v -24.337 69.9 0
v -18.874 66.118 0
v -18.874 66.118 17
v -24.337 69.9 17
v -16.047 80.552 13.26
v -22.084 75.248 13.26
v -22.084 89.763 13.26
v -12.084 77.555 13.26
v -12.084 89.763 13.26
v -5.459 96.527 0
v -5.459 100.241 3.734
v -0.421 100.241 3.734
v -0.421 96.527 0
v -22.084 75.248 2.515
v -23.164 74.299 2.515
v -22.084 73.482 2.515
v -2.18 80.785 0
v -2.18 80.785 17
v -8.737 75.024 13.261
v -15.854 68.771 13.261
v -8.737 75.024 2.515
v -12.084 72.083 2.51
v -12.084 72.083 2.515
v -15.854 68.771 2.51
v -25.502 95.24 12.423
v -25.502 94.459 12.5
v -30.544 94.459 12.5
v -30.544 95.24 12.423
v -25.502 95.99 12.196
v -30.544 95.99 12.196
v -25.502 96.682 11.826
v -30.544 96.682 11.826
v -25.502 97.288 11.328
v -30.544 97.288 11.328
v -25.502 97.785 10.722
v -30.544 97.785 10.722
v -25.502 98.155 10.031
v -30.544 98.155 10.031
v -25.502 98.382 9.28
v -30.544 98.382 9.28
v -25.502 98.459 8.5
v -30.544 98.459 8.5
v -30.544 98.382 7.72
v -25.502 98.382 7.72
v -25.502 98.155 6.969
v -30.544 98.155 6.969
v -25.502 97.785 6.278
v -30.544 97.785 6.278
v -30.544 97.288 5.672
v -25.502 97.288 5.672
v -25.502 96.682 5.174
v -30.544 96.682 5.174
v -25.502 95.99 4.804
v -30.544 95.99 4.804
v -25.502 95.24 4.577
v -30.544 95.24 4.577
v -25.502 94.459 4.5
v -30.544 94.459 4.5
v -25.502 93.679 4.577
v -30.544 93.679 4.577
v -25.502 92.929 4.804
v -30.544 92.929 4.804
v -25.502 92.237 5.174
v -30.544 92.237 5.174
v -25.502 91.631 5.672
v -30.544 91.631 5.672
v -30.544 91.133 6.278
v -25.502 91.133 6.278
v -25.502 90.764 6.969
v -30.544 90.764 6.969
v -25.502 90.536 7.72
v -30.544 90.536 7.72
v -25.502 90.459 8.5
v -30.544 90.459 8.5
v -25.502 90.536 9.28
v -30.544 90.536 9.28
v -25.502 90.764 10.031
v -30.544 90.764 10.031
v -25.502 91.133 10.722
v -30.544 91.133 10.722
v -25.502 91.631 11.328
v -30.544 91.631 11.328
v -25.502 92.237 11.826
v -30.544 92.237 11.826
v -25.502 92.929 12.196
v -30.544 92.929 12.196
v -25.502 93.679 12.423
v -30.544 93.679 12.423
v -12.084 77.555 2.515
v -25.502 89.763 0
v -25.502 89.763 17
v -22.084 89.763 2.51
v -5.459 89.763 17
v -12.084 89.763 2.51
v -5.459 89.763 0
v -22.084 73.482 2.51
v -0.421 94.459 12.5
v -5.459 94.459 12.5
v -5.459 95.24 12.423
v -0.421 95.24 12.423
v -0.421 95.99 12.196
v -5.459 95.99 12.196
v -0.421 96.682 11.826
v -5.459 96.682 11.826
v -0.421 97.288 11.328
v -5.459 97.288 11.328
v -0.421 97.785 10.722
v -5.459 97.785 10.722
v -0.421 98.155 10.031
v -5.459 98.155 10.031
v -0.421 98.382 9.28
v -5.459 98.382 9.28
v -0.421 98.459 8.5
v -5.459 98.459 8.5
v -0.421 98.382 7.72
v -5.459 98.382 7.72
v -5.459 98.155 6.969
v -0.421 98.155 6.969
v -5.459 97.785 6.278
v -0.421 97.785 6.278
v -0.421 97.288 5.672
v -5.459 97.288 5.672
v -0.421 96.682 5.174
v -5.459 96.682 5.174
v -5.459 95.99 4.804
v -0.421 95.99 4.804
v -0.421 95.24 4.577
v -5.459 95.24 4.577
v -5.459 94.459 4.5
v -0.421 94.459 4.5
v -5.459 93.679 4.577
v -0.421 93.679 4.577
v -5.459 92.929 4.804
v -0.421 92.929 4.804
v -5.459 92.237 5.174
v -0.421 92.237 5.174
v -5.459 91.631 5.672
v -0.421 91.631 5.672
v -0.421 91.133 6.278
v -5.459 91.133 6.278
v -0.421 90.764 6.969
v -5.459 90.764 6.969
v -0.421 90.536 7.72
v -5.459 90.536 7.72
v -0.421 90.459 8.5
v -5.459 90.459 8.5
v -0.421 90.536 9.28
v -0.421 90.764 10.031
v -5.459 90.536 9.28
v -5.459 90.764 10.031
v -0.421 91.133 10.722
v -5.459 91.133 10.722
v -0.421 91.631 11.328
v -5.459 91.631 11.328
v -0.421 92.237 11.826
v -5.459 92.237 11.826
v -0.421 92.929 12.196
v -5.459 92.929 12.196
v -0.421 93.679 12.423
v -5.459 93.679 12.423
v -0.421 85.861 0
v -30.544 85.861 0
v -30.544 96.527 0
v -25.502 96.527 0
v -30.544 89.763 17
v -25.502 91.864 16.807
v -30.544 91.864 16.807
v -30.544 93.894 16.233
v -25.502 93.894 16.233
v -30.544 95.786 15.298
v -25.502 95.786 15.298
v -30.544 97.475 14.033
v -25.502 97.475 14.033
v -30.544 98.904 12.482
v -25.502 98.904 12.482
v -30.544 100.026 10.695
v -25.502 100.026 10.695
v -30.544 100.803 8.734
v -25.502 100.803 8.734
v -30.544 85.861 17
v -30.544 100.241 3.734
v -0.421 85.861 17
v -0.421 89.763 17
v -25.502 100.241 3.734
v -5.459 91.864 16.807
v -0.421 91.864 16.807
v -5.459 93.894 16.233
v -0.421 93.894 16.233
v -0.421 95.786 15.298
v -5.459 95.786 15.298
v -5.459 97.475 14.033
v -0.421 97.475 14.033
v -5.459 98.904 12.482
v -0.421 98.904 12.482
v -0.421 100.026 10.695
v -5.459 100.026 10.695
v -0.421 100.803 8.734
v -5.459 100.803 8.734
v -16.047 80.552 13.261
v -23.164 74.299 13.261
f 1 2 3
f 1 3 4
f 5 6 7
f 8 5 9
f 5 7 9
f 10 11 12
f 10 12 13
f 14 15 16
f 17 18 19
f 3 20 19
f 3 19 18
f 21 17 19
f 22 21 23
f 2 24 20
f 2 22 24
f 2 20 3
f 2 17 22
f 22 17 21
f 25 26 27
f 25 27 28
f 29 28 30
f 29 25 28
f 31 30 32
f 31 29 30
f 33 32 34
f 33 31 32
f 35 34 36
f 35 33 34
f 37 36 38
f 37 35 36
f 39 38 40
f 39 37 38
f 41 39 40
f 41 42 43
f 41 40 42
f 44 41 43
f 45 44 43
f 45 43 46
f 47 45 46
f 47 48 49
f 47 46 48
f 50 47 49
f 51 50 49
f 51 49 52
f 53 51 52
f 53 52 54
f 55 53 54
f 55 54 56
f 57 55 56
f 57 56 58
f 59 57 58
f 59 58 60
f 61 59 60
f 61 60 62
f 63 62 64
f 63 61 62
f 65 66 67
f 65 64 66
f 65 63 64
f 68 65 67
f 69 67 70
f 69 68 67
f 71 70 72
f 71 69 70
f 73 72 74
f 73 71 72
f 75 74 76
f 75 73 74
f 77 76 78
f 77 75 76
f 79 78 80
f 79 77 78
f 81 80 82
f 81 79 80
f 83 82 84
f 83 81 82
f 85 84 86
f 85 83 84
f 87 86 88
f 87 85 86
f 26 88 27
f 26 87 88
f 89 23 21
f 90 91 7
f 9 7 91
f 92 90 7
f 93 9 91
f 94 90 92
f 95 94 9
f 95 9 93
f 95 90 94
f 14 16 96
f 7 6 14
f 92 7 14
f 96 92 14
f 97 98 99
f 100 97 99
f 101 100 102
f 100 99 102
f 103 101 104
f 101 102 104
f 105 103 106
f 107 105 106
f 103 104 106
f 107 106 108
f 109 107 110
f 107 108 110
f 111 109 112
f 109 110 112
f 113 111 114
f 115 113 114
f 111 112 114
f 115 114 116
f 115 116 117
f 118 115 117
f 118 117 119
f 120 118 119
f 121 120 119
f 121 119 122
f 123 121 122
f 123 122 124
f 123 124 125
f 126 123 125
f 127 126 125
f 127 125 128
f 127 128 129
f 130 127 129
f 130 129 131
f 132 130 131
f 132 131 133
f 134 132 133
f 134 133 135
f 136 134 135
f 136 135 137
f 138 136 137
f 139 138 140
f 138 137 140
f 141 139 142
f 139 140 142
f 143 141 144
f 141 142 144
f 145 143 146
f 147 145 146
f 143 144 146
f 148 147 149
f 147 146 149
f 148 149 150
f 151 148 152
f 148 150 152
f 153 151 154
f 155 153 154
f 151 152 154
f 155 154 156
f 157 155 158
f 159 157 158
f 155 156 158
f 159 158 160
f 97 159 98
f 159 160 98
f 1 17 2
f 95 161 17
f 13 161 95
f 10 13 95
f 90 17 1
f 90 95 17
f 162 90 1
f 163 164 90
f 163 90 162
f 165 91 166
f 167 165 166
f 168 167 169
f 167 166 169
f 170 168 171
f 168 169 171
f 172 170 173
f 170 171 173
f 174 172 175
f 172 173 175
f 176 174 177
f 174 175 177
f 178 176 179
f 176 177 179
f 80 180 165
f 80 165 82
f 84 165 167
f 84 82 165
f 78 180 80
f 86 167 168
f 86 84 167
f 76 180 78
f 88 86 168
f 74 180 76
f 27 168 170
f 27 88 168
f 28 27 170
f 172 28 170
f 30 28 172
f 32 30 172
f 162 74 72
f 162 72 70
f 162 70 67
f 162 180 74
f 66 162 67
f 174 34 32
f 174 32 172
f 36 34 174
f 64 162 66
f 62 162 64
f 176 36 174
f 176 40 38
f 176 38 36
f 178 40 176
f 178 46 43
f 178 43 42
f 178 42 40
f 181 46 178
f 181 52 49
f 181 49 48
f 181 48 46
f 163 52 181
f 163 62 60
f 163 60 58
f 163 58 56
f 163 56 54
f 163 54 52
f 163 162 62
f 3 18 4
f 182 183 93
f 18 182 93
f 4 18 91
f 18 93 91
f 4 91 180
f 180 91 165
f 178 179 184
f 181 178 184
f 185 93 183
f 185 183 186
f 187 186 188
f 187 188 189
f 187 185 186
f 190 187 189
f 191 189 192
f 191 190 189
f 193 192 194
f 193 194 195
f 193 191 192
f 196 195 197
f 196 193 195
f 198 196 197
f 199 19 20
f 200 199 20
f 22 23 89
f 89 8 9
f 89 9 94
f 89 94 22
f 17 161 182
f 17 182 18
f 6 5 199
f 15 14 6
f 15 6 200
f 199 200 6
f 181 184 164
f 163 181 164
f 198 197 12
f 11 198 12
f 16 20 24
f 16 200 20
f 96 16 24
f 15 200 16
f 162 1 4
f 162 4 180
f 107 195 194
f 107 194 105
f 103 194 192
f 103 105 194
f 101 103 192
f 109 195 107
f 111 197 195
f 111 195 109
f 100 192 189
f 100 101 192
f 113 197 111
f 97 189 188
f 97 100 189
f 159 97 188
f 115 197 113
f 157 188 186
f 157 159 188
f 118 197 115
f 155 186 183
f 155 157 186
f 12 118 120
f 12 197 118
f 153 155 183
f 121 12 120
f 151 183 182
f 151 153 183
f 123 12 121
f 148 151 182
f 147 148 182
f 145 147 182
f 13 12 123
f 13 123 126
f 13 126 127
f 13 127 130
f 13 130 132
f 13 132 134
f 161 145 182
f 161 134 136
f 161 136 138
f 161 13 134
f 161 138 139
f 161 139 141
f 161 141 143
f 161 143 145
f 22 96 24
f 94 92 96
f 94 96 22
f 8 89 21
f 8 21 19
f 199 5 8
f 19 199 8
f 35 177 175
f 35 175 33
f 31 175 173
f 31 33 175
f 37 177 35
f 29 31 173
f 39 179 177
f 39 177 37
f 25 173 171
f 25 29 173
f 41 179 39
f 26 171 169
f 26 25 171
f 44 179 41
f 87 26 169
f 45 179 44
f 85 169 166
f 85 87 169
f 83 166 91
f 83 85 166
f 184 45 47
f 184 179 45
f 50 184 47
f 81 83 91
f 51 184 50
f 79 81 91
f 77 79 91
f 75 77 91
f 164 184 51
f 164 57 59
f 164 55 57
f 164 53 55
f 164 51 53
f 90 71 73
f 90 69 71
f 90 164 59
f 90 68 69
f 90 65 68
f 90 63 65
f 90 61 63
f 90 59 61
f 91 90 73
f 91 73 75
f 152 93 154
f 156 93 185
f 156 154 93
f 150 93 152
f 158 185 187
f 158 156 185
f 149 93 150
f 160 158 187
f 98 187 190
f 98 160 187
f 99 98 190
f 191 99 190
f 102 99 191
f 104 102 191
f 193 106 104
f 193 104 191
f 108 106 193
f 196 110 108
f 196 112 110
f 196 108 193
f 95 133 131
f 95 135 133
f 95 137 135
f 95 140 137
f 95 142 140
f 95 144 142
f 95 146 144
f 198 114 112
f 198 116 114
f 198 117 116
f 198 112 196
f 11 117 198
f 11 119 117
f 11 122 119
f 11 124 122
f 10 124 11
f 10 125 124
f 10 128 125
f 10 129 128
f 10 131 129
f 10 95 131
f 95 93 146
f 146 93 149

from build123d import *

# Parameters (mm, degrees)
BOSS_EXTRUDE1_DEPTH     = 17
CUT_EXTRUDE1_DEPTH      = 44
CUT_EXTRUDE1_DEPTH_BACK = 15
SKETCH3_W               = 9.473572921
SKETCH3_H               = 10.746142417
CUT_EXTRUDE4_REACH      = 25.646
SKETCH5_W               = 10
SKETCH5_H               = 10.75
SKETCH6_R               = 4
CUT_EXTRUDE5_DEPTH      = 16.063287133
CUT_EXTRUDE5_DEPTH_BACK = 16.059572792


with BuildPart() as part:
    # Sketch1 → Boss-Extrude1 (new body)
    with BuildSketch(Plane.XY):
        Polygon((-30.543999746, 100.861422718), (-25.501974605, 100.861422718), (-25.501974605, 89.763425291), (-5.459450623, 89.763425291), (-5.459450623, 100.861422718), (-0.421139822, 100.861422718), (-0.421139822, 85.861422718), (-2.179573068, 80.78462442), (-18.874125124, 66.117800283), (-24.336952566, 69.899502921), (-30.543999746, 85.861422718), align=None)
    extrude(amount=BOSS_EXTRUDE1_DEPTH)

    # Sketch2 → Cut-Extrude1 (cut, two sides)
    with BuildSketch(Plane(origin=(-25.501974605, 0, 0), x_dir=(0, 0, -1), z_dir=(1, 0, 0))) as cut_extrude1_sk:
        with BuildLine():
            Line((-17, 100.861422718), (-17, 89.763425291))
            ThreePointArc((-17, 89.763425291), (-14.704510799, 96.659236925), (-8.73400026, 100.803448872))
            Line((-8.73400026, 100.803448872), (-3.73400026, 100.241430104))
            Line((-3.73400026, 100.241430104), (0, 96.527419984))
            Line((0, 96.527419984), (0, 100.861422718))
            Line((0, 100.861422718), (-17, 100.861422718))
        make_face()
    extrude(amount=CUT_EXTRUDE1_DEPTH, mode=Mode.SUBTRACT)
    extrude(cut_extrude1_sk.sketch, amount=-CUT_EXTRUDE1_DEPTH_BACK, mode=Mode.SUBTRACT)

    # Cut-Sweep1: sweep along a path in Sketch4
    with BuildLine(Plane.XY.offset(10)) as cut_sweep1_path:
        Line((-14.80649526, 69.691373965), (-22.116585307, 75.218908697))
    # Sketch3 → Cut-Sweep1 (sweep, cut)
    with BuildSketch(Plane(origin=(-41.005446227, 46.67455955, 0), x_dir=(0.7512574, 0.660009333, 0), z_dir=(0.660009333, -0.7512574, 0))):
        with Locations((38.216319794, 7.888020567)):
            Rectangle(SKETCH3_W, SKETCH3_H)
    sweep(path=cut_sweep1_path.line, mode=Mode.SUBTRACT)

    # Cut-Extrude4: up to this face of the body (flat: up to its plane)
    cut_extrude4_end = Plane(part.part.faces().sort_by_distance((-19.508744094, 71.535131374, 7.888020567))[0])
    # Sketch5 → Cut-Extrude4 (cut, up to the picked face)
    with BuildSketch(Plane(origin=(0, 89.763425291, 0), x_dir=(1, 0, 0), z_dir=(0, 1, 0)), mode=Mode.PRIVATE) as cut_extrude4_sk1:
        with Locations((-17.083999746, -7.885)):
            Rectangle(SKETCH5_W, SKETCH5_H)
    cut_extrude4_tool1 = split(extrude(cut_extrude4_sk1.sketch, amount=-CUT_EXTRUDE4_REACH, mode=Mode.PRIVATE), bisect_by=cut_extrude4_end, keep=Keep.BOTH, mode=Mode.PRIVATE)
    add(cut_extrude4_tool1.solids().sort_by_distance((-17.084, 89.763425, 7.885))[0], mode=Mode.SUBTRACT)

    # Sketch6 → Cut-Extrude5 (cut, two sides)
    with BuildSketch(Plane.ZY.offset(15.480712614)) as cut_extrude5_sk:
        with Locations((8.5, 94.459280843)):
            Circle(SKETCH6_R)
    extrude(amount=CUT_EXTRUDE5_DEPTH, mode=Mode.SUBTRACT)
    extrude(cut_extrude5_sk.sketch, amount=-CUT_EXTRUDE5_DEPTH_BACK, mode=Mode.SUBTRACT)


solid = part.part
